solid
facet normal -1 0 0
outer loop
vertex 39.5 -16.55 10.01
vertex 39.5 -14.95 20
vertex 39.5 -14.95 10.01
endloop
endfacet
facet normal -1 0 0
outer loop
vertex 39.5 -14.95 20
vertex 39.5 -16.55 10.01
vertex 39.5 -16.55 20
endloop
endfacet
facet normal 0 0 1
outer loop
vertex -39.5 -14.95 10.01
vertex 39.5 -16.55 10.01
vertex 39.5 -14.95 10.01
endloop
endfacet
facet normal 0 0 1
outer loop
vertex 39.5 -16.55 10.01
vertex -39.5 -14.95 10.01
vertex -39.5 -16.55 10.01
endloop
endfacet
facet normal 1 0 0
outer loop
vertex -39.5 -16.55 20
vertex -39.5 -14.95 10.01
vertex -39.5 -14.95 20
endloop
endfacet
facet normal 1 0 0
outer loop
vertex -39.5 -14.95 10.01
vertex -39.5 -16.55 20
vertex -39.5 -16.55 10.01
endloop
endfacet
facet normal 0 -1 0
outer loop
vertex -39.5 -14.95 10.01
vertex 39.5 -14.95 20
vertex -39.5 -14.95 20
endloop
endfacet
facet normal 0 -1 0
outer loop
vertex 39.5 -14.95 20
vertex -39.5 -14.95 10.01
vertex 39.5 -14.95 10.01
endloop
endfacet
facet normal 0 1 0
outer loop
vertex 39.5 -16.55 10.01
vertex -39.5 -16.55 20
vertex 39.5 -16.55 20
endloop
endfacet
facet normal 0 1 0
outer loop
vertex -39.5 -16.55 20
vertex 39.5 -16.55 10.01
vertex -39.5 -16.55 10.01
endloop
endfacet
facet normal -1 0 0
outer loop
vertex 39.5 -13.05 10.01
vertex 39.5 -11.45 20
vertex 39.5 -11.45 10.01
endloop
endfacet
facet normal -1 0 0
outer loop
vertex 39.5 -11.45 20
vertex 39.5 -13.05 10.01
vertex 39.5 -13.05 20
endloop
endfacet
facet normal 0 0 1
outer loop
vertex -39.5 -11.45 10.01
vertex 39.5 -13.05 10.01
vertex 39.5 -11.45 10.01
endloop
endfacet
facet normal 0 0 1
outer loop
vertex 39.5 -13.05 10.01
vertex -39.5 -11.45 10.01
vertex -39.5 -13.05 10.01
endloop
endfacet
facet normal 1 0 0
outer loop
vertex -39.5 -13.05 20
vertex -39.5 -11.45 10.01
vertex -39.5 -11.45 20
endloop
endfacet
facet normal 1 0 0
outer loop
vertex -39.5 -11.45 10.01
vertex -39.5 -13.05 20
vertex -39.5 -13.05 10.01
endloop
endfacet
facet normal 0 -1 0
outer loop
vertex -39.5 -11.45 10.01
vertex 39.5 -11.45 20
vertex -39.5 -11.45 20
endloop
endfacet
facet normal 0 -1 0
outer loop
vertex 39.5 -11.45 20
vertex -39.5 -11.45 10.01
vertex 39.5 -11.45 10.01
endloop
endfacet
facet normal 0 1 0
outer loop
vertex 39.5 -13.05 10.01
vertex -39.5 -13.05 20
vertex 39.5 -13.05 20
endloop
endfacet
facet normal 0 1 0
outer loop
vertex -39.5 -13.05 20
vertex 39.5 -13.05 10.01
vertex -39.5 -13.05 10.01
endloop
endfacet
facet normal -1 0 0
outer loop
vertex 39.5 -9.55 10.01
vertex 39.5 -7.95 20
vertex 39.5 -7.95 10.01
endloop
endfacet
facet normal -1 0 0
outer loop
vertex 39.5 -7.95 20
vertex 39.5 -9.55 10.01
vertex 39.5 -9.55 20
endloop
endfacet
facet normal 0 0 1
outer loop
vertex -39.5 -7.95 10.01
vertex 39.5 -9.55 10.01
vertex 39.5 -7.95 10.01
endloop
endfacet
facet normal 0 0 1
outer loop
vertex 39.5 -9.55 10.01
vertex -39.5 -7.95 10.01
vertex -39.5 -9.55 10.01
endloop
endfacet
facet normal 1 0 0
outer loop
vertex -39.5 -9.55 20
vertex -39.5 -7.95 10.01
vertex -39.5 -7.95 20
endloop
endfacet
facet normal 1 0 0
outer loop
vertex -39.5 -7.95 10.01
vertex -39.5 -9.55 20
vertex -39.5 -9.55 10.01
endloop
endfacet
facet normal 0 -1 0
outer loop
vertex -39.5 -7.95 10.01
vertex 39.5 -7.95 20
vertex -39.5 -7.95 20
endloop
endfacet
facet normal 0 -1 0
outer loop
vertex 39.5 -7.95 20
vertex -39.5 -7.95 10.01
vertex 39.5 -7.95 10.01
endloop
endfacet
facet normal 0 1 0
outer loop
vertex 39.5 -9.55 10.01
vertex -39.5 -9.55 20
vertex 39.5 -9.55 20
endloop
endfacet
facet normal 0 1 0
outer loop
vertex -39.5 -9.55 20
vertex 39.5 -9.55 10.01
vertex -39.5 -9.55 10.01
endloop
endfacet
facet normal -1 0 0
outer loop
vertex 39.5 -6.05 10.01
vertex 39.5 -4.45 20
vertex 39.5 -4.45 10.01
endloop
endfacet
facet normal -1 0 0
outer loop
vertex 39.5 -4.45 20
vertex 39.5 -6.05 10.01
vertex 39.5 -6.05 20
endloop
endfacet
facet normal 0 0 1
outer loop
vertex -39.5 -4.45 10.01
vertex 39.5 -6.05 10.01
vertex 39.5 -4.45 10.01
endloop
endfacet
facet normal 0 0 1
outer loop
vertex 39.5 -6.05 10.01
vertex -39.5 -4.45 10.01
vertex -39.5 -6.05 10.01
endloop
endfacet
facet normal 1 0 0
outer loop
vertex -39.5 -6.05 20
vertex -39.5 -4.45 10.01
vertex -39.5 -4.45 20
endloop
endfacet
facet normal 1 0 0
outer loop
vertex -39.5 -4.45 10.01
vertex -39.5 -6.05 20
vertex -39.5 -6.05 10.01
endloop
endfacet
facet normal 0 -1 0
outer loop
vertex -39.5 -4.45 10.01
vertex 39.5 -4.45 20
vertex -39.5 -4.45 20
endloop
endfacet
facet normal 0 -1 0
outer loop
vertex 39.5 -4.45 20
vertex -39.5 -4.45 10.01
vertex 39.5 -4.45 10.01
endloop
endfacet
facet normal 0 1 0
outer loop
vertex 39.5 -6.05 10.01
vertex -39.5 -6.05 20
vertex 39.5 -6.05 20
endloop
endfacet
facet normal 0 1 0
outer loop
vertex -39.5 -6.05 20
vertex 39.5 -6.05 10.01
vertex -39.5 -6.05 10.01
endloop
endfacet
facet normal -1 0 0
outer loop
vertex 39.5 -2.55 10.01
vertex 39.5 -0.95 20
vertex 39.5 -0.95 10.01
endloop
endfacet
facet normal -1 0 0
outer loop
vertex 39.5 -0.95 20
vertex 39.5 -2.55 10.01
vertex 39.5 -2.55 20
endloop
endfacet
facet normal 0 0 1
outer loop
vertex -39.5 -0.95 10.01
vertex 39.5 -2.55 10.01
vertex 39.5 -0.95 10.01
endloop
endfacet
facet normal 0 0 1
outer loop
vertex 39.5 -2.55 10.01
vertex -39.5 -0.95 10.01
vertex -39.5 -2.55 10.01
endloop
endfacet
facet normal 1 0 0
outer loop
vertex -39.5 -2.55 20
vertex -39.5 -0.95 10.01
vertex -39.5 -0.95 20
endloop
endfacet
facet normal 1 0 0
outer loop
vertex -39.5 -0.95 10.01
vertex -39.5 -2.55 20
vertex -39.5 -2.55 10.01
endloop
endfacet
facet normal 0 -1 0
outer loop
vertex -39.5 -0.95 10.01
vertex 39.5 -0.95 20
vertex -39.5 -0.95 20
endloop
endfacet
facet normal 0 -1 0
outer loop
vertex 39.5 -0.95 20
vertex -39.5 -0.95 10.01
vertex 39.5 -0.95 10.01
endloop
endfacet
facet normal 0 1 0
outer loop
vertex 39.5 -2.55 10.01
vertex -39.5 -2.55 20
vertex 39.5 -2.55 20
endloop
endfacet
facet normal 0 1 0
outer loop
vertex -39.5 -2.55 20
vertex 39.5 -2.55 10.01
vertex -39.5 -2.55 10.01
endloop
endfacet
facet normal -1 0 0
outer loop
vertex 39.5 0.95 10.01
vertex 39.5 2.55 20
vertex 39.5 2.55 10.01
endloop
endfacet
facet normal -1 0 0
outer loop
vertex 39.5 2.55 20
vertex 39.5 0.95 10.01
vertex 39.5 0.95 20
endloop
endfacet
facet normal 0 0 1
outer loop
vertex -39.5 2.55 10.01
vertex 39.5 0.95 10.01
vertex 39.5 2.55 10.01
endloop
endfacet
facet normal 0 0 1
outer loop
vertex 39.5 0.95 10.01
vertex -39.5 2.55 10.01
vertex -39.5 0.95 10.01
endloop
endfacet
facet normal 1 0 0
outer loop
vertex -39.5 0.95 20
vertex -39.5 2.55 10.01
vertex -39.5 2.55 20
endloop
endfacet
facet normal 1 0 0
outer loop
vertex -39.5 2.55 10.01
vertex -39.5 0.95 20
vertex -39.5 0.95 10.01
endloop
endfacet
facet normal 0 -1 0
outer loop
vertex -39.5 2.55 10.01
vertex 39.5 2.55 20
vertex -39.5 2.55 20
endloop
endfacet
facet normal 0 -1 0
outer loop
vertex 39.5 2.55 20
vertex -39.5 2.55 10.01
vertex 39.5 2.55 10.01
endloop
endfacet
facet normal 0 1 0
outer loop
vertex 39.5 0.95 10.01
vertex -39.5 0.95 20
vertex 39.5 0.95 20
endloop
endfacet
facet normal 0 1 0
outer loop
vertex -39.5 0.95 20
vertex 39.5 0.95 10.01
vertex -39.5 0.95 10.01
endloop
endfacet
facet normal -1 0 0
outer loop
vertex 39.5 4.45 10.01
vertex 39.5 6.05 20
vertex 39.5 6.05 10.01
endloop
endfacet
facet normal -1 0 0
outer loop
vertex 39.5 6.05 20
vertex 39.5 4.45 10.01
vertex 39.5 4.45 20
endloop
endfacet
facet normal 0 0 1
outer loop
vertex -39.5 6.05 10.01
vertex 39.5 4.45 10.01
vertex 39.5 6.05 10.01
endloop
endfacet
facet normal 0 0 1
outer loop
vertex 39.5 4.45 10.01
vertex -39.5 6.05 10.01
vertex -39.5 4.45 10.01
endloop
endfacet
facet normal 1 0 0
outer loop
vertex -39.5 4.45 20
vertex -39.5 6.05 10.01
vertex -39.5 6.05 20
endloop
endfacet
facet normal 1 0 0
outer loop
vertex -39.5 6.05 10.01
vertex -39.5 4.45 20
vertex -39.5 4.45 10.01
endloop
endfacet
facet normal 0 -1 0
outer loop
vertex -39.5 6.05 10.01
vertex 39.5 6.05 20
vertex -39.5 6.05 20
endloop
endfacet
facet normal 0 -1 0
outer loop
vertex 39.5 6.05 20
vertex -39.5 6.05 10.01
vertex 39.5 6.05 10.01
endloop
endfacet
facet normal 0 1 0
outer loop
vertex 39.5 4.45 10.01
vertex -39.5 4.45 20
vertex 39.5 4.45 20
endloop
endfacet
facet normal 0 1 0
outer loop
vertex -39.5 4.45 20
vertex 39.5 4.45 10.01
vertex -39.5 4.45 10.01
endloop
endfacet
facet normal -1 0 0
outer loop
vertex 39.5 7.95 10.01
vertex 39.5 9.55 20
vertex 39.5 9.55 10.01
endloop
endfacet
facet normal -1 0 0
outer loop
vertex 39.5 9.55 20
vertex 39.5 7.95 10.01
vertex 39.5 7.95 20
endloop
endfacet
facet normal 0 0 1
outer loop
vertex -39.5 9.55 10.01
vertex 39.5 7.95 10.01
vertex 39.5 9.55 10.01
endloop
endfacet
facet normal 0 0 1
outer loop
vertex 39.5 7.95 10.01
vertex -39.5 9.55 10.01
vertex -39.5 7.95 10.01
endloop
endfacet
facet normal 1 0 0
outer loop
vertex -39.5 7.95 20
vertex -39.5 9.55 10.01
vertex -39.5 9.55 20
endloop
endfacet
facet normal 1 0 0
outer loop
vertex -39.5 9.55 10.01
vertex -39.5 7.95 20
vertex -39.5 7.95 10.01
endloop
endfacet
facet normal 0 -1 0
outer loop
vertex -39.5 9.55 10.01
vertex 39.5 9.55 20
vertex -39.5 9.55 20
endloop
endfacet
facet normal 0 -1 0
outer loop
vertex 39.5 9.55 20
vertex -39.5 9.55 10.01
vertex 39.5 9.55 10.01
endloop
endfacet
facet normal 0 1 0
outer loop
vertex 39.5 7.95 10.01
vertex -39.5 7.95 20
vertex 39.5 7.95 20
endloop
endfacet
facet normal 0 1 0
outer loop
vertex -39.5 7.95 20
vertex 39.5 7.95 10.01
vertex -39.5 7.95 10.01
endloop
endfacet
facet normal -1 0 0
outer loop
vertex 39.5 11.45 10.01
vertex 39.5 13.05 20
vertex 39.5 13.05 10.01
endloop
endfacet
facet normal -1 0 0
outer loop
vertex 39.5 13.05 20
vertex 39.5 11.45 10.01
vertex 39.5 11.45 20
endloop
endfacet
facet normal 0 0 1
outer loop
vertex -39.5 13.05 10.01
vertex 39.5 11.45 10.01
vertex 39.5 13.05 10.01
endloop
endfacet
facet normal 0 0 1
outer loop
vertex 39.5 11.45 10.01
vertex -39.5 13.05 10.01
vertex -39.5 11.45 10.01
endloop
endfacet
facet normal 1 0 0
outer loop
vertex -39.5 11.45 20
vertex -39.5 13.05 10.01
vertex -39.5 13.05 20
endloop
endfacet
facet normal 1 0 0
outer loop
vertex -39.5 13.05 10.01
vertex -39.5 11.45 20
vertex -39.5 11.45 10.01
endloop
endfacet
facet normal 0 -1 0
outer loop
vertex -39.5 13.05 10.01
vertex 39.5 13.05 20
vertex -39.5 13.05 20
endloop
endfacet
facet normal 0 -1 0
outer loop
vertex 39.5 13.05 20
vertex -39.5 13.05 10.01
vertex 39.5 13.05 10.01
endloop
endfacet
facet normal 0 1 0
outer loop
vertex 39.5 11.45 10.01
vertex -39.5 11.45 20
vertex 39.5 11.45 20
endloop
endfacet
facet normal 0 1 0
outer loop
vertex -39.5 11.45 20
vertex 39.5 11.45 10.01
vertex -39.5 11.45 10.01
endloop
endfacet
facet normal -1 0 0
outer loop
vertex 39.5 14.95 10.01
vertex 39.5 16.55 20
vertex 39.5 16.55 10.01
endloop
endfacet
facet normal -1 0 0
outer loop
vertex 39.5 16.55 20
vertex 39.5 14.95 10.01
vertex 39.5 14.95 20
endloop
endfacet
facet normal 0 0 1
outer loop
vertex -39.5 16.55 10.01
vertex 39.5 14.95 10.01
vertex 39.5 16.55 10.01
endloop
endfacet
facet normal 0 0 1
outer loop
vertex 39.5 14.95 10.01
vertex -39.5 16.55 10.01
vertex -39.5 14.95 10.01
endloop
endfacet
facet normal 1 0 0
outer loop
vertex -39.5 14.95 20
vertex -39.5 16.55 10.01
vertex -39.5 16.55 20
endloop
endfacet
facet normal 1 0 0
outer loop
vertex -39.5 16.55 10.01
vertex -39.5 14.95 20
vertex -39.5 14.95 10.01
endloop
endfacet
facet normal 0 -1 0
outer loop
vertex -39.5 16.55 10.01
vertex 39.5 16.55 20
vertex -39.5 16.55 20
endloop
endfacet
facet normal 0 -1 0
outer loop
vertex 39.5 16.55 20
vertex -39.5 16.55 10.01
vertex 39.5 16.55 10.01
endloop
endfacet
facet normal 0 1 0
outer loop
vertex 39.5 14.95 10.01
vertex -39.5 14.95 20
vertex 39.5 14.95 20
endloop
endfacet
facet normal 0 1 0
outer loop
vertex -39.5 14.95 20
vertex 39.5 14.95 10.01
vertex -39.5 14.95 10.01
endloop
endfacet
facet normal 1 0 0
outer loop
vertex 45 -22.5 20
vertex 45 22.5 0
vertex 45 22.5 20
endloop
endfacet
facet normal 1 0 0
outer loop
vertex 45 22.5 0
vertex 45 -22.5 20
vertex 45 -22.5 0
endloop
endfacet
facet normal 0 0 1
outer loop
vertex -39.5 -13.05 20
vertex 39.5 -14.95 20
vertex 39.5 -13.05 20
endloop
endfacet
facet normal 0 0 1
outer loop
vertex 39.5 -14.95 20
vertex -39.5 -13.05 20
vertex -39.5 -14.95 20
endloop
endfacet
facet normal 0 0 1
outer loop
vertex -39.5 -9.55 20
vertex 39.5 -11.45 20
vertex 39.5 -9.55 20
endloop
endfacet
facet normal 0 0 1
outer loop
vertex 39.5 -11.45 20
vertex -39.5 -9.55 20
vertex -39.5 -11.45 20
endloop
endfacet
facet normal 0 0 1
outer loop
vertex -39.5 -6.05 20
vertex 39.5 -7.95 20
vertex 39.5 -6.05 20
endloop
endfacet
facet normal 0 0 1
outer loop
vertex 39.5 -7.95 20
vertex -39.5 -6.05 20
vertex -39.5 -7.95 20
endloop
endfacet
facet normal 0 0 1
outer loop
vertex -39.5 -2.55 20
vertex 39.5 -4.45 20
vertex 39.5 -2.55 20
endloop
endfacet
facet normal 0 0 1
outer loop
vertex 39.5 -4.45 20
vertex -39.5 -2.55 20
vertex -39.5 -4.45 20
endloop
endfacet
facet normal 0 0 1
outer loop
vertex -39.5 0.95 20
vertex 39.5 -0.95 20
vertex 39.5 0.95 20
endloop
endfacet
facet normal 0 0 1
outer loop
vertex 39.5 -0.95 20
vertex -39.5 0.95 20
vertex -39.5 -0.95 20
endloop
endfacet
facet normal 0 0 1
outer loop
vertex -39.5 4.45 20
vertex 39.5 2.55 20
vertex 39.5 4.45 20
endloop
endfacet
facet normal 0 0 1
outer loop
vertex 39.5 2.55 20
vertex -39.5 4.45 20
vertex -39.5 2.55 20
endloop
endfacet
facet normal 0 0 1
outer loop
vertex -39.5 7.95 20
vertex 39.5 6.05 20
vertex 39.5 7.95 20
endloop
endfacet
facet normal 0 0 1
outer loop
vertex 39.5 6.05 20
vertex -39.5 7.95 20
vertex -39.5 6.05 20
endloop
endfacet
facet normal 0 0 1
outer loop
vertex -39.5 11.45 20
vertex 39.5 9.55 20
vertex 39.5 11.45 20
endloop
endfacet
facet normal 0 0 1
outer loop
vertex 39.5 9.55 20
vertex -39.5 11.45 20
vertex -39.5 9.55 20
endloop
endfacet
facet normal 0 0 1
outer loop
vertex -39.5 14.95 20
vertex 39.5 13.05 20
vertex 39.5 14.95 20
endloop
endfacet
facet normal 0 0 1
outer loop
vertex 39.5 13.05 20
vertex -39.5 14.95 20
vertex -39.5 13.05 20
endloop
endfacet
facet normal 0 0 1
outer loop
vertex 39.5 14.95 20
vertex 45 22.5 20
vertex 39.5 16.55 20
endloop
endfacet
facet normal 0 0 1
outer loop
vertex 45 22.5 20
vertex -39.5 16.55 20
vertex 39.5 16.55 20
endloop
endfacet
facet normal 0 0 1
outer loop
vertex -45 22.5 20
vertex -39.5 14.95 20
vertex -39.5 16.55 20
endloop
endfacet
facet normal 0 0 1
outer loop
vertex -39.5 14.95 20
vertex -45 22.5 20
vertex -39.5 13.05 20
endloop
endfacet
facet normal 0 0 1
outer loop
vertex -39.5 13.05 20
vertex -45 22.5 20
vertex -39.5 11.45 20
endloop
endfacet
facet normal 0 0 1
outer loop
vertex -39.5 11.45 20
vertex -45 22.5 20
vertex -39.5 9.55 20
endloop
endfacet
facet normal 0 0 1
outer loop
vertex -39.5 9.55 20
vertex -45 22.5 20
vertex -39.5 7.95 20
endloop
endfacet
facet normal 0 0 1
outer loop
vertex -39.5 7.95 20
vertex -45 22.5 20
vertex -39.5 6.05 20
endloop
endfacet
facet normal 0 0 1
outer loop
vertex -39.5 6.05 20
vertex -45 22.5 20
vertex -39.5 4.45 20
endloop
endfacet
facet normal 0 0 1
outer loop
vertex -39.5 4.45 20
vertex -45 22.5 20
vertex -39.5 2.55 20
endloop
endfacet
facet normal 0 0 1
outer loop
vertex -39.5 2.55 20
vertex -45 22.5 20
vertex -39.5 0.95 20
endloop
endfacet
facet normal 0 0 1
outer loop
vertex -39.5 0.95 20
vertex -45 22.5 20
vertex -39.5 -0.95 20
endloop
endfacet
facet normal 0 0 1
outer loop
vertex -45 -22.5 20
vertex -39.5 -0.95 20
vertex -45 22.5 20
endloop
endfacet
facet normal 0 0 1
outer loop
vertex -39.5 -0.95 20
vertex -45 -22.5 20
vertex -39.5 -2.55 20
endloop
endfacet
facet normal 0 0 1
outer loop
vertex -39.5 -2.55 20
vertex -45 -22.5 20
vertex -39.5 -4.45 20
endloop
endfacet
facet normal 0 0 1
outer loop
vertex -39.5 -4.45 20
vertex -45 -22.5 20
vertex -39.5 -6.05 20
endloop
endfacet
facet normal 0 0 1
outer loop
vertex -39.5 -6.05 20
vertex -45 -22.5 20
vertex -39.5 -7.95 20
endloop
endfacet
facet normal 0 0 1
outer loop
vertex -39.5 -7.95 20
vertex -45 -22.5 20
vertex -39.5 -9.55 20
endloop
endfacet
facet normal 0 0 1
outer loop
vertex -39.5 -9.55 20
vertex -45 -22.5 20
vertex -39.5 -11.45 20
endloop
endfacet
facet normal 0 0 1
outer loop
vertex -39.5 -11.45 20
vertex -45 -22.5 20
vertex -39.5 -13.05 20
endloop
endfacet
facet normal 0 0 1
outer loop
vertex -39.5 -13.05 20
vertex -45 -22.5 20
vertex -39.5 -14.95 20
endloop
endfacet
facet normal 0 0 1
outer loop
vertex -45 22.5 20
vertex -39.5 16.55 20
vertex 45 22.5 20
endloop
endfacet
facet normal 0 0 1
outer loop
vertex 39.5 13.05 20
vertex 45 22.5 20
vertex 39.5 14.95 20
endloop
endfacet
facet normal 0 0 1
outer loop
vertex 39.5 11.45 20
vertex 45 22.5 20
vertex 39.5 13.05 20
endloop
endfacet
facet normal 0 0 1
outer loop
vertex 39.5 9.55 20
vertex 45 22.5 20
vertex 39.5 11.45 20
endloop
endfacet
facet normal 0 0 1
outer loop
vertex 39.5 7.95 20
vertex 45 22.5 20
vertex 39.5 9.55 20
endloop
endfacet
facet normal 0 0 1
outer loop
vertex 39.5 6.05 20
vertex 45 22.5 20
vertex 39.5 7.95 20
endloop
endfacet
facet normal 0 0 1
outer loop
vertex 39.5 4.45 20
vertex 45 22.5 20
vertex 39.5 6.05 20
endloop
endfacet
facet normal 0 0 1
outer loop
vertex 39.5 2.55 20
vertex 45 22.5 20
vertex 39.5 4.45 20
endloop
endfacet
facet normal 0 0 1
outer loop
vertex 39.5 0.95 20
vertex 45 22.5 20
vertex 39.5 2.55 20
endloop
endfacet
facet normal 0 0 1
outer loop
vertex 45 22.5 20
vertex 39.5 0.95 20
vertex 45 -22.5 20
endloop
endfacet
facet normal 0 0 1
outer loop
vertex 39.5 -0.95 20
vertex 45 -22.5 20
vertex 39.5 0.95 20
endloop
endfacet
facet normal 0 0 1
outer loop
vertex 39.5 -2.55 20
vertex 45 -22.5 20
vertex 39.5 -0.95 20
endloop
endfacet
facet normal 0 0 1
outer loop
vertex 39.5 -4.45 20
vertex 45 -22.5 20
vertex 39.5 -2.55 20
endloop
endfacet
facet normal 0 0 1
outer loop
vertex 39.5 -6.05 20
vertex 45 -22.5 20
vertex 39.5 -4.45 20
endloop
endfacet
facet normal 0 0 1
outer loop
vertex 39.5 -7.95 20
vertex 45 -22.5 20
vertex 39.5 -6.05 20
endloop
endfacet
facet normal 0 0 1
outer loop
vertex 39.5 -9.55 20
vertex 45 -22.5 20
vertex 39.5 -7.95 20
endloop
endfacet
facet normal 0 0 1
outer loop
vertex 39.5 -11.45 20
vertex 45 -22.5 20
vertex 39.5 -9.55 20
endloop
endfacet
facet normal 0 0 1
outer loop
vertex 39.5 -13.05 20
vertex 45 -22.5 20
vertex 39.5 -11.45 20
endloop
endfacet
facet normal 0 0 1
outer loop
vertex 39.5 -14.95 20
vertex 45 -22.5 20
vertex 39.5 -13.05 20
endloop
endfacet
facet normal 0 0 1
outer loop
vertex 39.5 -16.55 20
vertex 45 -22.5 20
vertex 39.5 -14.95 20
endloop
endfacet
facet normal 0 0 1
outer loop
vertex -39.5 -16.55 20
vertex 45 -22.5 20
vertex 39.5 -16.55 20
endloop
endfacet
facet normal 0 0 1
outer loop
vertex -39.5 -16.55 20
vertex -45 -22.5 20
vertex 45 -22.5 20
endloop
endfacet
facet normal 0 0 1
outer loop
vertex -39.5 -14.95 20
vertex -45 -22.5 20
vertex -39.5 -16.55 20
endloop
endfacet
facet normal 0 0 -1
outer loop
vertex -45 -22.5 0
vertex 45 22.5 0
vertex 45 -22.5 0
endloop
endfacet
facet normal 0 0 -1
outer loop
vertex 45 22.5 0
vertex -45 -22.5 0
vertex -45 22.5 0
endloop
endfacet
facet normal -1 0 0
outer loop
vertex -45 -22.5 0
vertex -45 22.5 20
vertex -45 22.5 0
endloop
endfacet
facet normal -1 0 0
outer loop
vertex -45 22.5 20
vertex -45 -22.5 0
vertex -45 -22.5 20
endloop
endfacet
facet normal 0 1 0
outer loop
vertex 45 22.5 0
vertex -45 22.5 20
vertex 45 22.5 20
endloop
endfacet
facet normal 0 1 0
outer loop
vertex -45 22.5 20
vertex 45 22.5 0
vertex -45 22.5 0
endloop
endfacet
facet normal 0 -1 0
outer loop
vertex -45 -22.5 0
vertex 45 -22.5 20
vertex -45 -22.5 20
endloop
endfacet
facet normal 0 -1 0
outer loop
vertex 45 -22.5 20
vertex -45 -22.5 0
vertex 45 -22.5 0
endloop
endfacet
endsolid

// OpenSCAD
// Microscope Slide Drying Rack
// Designed for 10 slides (75x25x1mm) standing on long edge.

// Block dimensions
L_block = 90.0;    // Length (X)
W_block = 45.0;    // Width (Y)
H_block = 20.0;    // Height (Z)

// Slot dimensions
L_slot = 77.0;     // Slot length (X)
W_slot = 1.6;      // Slot width (Y)
D_slot = 10.0;     // Slot depth (Z)
N_slots = 10;      // Number of slots
P_slots = 3.5;     // Pitch (center-to-center distance in Y)

$fn = 64;

// Calculate the starting Y position to center the group of slots
// The total width occupied by the slots from center of first to center of last is (N-1) * P
// The offset from the center of the block to the center of the first slot is:
// (Total_Width_of_group / 2) - (W_slot / 2) is not quite right for centering.
// To center a group of N items with pitch P:
// The distance from the center of the middle of the group to the center of the first slot is:
// (N-1) * P / 2.
// However, we want the group to be centered. 
// The center of the first slot will be at: -( (N-1) * P / 2 )
// The center of the last slot will be at: +( (N-1) * P / 2 )

module rack() {
    difference() {
        // The main base block
        translate([-L_block/2, -W_block/2, 0])
            cube([L_block, W_block, H_block]);

        // The slots
        for (i = [0 : N_slots - 1]) {
            // Calculate Y position for this slot to ensure the group is centered
            // Center of first slot: -(N-1)*P/2
            // Center of i-th slot: -(N-1)*P/2 + i*P
            y_pos = (-(N_slots - 1) * P_slots / 2) + (i * P_slots);
            
            // We translate the slot so its center is at (0, y_pos, H_block - D_slot)
            // But since we are cutting from the top, we use a cube and translate it.
            // To ensure a clean cut, we extend the slot slightly in Z and X.
            translate([-L_slot/2 - 1, y_pos - W_slot/2, H_block - D_slot + 0.01])
                cube([L_slot + 2, W_slot, D_slot + 0.01]);
        }
    }
}

// Render the part
rack();
